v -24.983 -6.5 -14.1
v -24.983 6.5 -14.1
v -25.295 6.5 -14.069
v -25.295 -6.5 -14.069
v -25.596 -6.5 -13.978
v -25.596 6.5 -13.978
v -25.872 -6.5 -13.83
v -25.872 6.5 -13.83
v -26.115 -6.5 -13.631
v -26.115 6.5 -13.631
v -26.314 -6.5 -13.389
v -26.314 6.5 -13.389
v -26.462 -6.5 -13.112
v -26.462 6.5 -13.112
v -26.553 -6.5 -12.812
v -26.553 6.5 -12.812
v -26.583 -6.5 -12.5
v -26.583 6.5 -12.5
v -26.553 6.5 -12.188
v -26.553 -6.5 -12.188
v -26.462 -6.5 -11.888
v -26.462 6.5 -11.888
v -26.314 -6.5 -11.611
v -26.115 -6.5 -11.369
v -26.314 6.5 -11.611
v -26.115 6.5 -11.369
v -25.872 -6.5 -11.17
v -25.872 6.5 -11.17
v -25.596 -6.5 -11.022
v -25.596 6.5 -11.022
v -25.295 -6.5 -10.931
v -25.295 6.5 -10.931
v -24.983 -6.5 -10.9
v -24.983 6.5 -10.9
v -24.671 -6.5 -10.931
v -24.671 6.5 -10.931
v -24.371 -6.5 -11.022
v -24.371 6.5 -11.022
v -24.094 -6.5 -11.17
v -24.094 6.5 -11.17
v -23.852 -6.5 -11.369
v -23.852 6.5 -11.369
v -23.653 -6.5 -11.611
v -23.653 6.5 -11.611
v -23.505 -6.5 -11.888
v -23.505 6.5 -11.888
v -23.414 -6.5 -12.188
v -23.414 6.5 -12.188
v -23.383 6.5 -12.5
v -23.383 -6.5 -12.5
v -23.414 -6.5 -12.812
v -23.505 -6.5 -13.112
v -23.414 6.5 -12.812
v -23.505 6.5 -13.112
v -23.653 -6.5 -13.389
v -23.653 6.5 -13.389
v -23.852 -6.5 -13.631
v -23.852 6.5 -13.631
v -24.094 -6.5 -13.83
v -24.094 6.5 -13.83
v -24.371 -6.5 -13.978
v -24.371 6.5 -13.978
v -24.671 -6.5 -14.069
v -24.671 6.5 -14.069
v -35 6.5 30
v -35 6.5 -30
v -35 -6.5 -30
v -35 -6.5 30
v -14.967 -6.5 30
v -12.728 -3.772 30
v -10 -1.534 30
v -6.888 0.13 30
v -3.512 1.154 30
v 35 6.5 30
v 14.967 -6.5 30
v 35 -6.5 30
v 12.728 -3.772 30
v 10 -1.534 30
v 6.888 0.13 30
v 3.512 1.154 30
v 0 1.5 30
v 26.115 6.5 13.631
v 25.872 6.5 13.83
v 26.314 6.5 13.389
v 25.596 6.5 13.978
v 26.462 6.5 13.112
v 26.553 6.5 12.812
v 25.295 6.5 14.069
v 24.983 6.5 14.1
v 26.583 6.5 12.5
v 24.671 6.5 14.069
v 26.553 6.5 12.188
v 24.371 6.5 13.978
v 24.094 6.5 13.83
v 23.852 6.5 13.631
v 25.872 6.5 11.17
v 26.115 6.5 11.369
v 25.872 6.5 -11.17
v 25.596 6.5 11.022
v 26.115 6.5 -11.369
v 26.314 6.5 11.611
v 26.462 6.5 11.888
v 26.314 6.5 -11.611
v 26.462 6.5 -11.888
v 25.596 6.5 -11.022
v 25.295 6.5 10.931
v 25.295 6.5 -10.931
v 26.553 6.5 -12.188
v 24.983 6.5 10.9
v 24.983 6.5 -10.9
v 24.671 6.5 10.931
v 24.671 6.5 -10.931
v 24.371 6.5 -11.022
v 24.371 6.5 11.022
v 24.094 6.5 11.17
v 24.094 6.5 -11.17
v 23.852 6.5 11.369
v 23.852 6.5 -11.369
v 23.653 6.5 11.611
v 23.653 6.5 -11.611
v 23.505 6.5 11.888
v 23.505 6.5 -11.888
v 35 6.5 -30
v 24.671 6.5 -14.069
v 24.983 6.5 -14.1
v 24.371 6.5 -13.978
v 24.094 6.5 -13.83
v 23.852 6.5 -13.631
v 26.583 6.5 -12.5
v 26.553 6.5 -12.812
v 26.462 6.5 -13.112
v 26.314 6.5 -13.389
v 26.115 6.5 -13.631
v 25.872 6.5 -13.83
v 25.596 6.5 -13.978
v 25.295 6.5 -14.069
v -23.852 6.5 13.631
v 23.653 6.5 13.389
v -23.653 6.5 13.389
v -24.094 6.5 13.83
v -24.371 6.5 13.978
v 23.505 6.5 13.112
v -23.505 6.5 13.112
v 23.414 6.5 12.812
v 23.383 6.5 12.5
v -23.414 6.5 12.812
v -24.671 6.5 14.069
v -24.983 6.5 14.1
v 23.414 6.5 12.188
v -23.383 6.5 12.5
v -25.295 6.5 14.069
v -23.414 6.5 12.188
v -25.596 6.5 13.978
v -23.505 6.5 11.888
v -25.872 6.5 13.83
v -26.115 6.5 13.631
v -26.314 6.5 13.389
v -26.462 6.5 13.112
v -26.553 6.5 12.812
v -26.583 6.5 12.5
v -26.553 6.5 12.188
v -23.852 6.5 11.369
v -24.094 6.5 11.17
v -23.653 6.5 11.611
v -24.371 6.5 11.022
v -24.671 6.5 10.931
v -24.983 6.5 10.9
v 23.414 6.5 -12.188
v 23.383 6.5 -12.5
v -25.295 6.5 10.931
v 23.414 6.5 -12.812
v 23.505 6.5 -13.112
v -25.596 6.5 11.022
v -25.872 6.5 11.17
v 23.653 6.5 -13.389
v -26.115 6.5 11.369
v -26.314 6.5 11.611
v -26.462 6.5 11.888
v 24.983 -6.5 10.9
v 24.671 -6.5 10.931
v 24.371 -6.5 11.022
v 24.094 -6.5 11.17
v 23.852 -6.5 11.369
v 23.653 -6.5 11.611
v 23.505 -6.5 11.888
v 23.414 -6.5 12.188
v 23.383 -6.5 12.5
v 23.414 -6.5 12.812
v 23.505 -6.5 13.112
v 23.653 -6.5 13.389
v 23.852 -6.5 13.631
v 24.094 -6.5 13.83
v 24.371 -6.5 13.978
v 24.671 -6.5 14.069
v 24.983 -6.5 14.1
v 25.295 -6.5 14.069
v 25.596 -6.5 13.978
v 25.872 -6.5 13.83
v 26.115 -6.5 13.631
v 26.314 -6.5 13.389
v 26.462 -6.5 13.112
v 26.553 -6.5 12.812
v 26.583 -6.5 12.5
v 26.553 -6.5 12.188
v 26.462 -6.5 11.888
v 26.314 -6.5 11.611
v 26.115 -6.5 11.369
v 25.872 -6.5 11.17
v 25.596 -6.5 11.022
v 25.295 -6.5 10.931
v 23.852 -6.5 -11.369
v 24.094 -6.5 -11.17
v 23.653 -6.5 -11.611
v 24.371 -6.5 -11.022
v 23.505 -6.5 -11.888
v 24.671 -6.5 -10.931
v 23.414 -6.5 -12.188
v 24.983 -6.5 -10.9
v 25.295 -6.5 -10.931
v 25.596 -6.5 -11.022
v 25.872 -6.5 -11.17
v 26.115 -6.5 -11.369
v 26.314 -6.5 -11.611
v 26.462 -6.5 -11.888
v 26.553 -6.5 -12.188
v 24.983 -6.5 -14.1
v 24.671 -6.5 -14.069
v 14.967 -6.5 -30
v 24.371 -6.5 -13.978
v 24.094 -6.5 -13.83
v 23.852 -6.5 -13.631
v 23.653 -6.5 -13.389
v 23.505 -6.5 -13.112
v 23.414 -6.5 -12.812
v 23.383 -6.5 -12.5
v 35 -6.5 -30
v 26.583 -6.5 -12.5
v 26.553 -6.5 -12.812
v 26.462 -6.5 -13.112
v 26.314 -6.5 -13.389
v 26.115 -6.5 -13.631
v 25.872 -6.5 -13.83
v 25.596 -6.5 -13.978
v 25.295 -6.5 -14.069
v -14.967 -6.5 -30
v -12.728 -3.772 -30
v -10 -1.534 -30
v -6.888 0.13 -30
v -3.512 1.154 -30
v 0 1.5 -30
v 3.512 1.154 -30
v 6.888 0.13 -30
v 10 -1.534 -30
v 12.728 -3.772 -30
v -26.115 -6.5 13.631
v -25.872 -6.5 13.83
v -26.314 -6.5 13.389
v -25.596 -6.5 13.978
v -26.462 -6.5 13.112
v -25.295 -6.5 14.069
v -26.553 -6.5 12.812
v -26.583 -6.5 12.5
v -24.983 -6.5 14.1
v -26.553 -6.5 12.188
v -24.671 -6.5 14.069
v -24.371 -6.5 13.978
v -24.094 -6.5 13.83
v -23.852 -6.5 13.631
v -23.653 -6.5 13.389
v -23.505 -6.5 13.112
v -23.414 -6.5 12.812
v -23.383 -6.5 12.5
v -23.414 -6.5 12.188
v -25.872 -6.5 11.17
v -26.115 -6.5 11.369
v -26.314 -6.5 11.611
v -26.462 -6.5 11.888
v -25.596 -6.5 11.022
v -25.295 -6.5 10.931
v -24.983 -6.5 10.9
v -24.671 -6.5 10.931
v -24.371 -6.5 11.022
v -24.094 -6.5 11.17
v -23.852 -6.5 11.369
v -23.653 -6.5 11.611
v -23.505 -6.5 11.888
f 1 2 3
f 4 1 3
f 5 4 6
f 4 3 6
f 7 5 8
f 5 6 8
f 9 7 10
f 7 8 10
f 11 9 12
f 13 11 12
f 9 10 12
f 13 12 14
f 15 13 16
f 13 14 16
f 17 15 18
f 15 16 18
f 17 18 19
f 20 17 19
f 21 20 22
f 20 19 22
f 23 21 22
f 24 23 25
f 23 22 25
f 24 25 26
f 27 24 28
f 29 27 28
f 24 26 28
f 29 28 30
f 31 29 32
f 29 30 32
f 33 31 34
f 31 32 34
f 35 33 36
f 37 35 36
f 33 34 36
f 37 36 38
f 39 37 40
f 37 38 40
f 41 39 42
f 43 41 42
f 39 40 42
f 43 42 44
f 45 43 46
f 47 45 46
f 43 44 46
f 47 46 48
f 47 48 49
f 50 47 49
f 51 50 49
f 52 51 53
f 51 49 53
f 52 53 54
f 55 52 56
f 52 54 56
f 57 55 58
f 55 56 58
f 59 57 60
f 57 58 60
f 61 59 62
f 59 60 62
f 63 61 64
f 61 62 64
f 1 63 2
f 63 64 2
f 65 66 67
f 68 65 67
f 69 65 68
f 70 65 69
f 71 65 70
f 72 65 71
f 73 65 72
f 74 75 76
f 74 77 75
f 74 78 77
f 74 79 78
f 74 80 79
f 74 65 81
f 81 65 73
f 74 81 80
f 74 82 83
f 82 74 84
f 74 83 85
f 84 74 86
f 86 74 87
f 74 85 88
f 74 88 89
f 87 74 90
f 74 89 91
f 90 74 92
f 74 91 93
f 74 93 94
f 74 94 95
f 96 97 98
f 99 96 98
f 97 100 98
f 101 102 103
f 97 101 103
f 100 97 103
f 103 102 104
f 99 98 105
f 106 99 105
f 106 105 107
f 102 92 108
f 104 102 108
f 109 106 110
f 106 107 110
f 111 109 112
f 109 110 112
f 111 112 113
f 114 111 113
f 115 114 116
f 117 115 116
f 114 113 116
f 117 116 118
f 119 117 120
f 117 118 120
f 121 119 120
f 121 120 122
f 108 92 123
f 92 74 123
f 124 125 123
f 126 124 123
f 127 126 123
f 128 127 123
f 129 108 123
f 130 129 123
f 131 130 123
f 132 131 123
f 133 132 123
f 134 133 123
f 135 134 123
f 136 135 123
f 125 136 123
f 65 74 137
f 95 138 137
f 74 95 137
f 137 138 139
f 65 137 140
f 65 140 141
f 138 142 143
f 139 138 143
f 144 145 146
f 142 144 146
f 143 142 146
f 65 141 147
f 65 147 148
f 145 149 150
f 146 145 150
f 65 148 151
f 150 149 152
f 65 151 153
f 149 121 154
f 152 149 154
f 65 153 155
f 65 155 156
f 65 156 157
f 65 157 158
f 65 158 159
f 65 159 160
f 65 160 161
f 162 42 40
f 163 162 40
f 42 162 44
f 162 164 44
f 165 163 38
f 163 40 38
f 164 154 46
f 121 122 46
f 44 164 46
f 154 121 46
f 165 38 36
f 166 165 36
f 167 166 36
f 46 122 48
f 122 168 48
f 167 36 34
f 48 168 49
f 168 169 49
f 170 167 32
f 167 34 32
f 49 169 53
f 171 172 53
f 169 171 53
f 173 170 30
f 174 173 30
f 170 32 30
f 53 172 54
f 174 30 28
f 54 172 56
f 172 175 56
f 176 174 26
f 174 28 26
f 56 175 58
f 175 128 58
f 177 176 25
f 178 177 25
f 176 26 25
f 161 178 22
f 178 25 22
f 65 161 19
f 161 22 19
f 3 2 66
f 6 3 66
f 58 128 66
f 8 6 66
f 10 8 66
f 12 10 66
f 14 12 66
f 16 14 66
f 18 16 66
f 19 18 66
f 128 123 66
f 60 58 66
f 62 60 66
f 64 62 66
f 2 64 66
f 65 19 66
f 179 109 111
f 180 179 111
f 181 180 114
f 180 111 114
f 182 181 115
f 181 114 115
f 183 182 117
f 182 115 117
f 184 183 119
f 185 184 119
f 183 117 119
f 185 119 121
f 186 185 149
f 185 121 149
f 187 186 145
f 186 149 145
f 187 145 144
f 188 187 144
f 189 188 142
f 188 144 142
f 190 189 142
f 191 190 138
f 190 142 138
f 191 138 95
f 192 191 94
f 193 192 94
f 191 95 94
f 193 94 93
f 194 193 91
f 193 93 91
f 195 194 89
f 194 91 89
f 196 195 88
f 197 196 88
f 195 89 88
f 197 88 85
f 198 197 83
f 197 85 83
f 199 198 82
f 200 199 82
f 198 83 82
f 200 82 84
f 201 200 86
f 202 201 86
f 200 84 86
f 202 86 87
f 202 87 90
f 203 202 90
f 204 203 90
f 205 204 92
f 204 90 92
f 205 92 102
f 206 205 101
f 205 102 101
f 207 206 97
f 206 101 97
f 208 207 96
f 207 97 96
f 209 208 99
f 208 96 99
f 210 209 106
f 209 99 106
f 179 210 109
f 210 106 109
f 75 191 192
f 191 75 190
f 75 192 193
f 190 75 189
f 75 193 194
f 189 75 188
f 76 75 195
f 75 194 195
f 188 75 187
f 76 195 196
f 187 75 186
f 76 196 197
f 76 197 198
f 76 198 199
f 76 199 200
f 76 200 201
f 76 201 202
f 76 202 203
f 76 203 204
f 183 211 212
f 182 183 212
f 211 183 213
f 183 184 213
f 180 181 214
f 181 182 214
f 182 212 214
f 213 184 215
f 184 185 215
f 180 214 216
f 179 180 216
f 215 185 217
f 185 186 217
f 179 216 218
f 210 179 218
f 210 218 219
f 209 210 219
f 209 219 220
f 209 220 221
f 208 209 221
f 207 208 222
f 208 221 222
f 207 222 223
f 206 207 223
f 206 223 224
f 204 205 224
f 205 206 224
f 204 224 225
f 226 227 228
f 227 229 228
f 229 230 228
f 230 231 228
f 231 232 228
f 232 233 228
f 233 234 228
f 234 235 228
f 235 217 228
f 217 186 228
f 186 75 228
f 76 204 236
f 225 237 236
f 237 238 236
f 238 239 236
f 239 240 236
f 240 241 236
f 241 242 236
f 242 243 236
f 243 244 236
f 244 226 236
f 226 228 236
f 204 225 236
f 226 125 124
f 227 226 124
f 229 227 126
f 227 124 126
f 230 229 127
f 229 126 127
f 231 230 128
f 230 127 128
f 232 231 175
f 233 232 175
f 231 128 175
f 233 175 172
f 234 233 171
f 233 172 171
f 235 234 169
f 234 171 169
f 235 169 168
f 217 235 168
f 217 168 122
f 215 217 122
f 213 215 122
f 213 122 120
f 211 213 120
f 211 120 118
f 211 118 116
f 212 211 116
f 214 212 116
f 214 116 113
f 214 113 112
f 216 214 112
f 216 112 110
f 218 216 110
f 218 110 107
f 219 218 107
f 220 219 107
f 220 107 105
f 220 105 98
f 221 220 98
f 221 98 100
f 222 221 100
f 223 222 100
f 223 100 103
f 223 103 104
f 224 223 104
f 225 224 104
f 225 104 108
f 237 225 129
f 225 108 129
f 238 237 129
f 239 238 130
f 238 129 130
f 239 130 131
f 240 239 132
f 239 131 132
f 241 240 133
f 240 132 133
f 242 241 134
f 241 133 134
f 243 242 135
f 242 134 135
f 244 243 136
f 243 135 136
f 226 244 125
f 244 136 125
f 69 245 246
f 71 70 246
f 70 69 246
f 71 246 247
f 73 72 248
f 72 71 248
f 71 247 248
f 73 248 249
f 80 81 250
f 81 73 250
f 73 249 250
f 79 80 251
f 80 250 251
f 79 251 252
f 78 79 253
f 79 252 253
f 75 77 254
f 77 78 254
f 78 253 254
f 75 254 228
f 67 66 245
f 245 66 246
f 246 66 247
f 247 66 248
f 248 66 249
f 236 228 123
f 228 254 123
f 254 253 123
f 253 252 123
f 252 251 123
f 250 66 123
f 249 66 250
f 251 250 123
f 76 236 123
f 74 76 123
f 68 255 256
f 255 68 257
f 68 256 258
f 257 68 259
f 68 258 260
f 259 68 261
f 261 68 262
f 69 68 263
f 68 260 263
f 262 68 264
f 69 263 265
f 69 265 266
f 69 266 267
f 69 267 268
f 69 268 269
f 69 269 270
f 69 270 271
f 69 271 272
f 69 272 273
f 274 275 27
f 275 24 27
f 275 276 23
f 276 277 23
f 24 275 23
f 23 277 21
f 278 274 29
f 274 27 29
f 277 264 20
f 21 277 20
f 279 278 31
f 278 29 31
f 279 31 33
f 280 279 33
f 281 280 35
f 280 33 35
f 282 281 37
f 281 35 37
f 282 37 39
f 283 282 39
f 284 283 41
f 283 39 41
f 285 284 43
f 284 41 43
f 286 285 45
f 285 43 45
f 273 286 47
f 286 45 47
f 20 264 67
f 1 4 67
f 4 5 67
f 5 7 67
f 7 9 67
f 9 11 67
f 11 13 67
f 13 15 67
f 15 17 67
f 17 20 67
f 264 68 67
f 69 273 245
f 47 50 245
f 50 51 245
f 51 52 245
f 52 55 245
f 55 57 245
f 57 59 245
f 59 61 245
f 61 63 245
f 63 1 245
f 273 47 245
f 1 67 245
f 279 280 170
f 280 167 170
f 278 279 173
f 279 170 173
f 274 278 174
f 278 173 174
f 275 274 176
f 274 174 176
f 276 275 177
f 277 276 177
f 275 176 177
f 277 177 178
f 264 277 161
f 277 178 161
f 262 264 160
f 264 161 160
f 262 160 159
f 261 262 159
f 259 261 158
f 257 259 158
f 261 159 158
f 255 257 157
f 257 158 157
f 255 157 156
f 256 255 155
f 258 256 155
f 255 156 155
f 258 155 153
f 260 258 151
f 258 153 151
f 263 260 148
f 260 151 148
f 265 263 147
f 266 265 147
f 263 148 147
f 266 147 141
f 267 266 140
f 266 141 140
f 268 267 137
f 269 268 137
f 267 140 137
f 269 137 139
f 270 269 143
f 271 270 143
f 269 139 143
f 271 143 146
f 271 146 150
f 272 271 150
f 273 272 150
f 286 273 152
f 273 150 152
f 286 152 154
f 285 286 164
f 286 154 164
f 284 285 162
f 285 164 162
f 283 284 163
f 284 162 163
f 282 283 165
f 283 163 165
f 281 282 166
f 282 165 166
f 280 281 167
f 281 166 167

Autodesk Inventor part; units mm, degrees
ref_plane "YZ Plane" through (0, 0, 0) normal (1, 0, 0) x (0, 1, 0)
ref_plane "XZ Plane" through (0, 0, 0) normal (0, 1, 0) x (-1, 0, 0)
ref_plane "XY Plane" through (0, 0, 0) normal (0, 0, 1) x (1, 0, 0)
sketch "Sketch1" plane through (0, 0, 0) normal (0, 0, 1) x (1, 0, 0)
  line L0 (-35, -6.5) -> (35, -6.5)
  line L1 (35, -6.5) -> (35, 6.5)
  line L2 (35, 6.5) -> (-35, 6.5)
  line L3 (-35, 6.5) -> (-35, -6.5)
  line L4 (-35, -6.5) -> (35, 6.5) construction
  line L5 (35, -6.5) -> (-35, 6.5) construction
  circle A0 centre (0, -16.5) radius 18
  line L6 (0, 6.5) -> (0, -6.5) construction
  point P0 (0, 0)
  point P1 (0, 0)
  point P2 (-14.9666, -6.5)
  point P3 (14.9666, -6.5)
  dimension "d0" = 36
  dimension "d1" = 10
  dimension "d2" = 70
  dimension "d3" = 13
extrude "Extrusion1" add sketch "Sketch1" along normal mid plane 60 contours L3 L2 L1 L0 A0
sketch "Sketch2" plane through (14.9666, -6.5, -30) normal (0, -1, 0) x (1, 0, 0)
  line L0 (-29.9333, 0) -> (-49.9666, 0) projected
  line L1 (-29.9333, 0) -> (-29.9333, 60) projected
  line L2 (-49.9666, 60) -> (-29.9333, 60) projected
  line L3 (-49.9666, 60) -> (-49.9666, 0) projected
  line L4 (20.0334, 0) -> (0, 0) projected
  line L5 (20.0334, 0) -> (20.0334, 60) projected
  line L6 (0, 60) -> (20.0334, 60) projected
  line L7 (0, 0) -> (0, 60) projected
  line L8 (-49.9666, 60) -> (-29.9333, 60) projected
  line L9 (-39.9499, 60) -> (-39.9499, 0)
  line L10 (-29.9333, 0) -> (-49.9666, 0) projected
  line L11 (20.0334, 0) -> (0, 0) projected
  line L12 (10.0167, 0) -> (10.0167, 60)
  line L13 (-49.9666, 30) -> (20.0334, 30) construction
  line L14 (-49.9666, 17.5) -> (20.0334, 17.5)
  line L15 (20.0334, 17.5) -> (20.0334, 42.5)
  line L16 (20.0334, 42.5) -> (-49.9666, 42.5)
  line L17 (-49.9666, 42.5) -> (-49.9666, 17.5)
  line L18 (-49.9666, 17.5) -> (20.0334, 42.5) construction
  line L19 (20.0334, 17.5) -> (-49.9666, 42.5) construction
  point P0 (-14.9666, 30)
  point P1 (-39.9499, 42.5)
  point P2 (-39.9499, 17.5)
  point P3 (10.0167, 17.5)
  point P4 (10.0167, 42.5)
  dimension "d6" = 25
hole "Hole1" at (-24.9833, -6.5, 12.5) at (-24.9833, -6.5, -12.5) at (24.9833, -6.5, -12.5) at (24.9833, -6.5, 12.5) direction (0, 1, 0) diameter 3.2 end through all
properties part number "19_Kep_han_B" material "ABS Plastic"
